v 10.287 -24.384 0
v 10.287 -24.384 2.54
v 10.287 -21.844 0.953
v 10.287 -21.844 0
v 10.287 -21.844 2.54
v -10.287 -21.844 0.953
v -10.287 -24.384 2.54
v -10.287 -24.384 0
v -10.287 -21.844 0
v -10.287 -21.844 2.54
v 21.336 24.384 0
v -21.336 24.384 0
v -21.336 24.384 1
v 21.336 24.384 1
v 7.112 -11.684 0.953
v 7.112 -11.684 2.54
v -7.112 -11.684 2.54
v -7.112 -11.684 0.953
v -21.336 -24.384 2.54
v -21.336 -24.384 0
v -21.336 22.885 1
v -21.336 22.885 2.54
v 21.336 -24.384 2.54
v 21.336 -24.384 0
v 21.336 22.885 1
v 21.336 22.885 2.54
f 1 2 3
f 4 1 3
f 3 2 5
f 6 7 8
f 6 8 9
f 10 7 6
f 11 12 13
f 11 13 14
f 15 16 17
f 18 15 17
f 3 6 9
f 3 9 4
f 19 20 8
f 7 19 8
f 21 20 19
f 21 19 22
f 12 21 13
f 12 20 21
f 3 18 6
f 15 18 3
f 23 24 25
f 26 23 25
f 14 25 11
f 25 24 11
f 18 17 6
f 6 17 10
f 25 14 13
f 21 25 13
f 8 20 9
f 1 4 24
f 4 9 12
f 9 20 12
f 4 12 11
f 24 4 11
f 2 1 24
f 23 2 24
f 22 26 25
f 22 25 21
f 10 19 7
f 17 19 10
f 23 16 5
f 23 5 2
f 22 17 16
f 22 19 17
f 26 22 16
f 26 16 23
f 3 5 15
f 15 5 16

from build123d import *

# Parameters (mm, degrees)
F0_W     = 42.672
F0_H     = 48.768
F1_DEPTH = 2.54
F2_W     = 42.672
F2_H     = 1.54
F3_DEPTH = 1.4986
F4_W     = 20.574
F4_H     = 2.54
F5_DEPTH = 5.08
F7_DEPTH = 1.5875


with BuildPart() as f1:
    # F0 (on Top) → F1 (new body)
    with BuildSketch(Plane.XY):
        Rectangle(F0_W, F0_H)
    extrude(amount=F1_DEPTH)

    # F2 (on face) → F3 (cut)
    with BuildSketch(Plane(origin=(0, 24.384, 0), x_dir=(-1, 0, 0), z_dir=(0, 1, 0))):
        with Locations((0, 1.77)):
            Rectangle(F2_W, F2_H)
    extrude(amount=-F3_DEPTH, mode=Mode.SUBTRACT)

    # F4 (on face) → F5 (cut)
    with BuildSketch(Plane.XY.offset(2.54)):
        with Locations((0, -23.114)):
            Rectangle(F4_W, F4_H)
    extrude(amount=-F5_DEPTH, mode=Mode.SUBTRACT)

    # F6 (on face) → F7 (cut)
    with BuildSketch(Plane.XY.offset(2.54)):
        Polygon((-7.112, -11.684), (-10.287, -21.844), (10.287, -21.844), (7.112, -11.684), align=None)
    extrude(amount=-F7_DEPTH, mode=Mode.SUBTRACT)


solid = f1.part
